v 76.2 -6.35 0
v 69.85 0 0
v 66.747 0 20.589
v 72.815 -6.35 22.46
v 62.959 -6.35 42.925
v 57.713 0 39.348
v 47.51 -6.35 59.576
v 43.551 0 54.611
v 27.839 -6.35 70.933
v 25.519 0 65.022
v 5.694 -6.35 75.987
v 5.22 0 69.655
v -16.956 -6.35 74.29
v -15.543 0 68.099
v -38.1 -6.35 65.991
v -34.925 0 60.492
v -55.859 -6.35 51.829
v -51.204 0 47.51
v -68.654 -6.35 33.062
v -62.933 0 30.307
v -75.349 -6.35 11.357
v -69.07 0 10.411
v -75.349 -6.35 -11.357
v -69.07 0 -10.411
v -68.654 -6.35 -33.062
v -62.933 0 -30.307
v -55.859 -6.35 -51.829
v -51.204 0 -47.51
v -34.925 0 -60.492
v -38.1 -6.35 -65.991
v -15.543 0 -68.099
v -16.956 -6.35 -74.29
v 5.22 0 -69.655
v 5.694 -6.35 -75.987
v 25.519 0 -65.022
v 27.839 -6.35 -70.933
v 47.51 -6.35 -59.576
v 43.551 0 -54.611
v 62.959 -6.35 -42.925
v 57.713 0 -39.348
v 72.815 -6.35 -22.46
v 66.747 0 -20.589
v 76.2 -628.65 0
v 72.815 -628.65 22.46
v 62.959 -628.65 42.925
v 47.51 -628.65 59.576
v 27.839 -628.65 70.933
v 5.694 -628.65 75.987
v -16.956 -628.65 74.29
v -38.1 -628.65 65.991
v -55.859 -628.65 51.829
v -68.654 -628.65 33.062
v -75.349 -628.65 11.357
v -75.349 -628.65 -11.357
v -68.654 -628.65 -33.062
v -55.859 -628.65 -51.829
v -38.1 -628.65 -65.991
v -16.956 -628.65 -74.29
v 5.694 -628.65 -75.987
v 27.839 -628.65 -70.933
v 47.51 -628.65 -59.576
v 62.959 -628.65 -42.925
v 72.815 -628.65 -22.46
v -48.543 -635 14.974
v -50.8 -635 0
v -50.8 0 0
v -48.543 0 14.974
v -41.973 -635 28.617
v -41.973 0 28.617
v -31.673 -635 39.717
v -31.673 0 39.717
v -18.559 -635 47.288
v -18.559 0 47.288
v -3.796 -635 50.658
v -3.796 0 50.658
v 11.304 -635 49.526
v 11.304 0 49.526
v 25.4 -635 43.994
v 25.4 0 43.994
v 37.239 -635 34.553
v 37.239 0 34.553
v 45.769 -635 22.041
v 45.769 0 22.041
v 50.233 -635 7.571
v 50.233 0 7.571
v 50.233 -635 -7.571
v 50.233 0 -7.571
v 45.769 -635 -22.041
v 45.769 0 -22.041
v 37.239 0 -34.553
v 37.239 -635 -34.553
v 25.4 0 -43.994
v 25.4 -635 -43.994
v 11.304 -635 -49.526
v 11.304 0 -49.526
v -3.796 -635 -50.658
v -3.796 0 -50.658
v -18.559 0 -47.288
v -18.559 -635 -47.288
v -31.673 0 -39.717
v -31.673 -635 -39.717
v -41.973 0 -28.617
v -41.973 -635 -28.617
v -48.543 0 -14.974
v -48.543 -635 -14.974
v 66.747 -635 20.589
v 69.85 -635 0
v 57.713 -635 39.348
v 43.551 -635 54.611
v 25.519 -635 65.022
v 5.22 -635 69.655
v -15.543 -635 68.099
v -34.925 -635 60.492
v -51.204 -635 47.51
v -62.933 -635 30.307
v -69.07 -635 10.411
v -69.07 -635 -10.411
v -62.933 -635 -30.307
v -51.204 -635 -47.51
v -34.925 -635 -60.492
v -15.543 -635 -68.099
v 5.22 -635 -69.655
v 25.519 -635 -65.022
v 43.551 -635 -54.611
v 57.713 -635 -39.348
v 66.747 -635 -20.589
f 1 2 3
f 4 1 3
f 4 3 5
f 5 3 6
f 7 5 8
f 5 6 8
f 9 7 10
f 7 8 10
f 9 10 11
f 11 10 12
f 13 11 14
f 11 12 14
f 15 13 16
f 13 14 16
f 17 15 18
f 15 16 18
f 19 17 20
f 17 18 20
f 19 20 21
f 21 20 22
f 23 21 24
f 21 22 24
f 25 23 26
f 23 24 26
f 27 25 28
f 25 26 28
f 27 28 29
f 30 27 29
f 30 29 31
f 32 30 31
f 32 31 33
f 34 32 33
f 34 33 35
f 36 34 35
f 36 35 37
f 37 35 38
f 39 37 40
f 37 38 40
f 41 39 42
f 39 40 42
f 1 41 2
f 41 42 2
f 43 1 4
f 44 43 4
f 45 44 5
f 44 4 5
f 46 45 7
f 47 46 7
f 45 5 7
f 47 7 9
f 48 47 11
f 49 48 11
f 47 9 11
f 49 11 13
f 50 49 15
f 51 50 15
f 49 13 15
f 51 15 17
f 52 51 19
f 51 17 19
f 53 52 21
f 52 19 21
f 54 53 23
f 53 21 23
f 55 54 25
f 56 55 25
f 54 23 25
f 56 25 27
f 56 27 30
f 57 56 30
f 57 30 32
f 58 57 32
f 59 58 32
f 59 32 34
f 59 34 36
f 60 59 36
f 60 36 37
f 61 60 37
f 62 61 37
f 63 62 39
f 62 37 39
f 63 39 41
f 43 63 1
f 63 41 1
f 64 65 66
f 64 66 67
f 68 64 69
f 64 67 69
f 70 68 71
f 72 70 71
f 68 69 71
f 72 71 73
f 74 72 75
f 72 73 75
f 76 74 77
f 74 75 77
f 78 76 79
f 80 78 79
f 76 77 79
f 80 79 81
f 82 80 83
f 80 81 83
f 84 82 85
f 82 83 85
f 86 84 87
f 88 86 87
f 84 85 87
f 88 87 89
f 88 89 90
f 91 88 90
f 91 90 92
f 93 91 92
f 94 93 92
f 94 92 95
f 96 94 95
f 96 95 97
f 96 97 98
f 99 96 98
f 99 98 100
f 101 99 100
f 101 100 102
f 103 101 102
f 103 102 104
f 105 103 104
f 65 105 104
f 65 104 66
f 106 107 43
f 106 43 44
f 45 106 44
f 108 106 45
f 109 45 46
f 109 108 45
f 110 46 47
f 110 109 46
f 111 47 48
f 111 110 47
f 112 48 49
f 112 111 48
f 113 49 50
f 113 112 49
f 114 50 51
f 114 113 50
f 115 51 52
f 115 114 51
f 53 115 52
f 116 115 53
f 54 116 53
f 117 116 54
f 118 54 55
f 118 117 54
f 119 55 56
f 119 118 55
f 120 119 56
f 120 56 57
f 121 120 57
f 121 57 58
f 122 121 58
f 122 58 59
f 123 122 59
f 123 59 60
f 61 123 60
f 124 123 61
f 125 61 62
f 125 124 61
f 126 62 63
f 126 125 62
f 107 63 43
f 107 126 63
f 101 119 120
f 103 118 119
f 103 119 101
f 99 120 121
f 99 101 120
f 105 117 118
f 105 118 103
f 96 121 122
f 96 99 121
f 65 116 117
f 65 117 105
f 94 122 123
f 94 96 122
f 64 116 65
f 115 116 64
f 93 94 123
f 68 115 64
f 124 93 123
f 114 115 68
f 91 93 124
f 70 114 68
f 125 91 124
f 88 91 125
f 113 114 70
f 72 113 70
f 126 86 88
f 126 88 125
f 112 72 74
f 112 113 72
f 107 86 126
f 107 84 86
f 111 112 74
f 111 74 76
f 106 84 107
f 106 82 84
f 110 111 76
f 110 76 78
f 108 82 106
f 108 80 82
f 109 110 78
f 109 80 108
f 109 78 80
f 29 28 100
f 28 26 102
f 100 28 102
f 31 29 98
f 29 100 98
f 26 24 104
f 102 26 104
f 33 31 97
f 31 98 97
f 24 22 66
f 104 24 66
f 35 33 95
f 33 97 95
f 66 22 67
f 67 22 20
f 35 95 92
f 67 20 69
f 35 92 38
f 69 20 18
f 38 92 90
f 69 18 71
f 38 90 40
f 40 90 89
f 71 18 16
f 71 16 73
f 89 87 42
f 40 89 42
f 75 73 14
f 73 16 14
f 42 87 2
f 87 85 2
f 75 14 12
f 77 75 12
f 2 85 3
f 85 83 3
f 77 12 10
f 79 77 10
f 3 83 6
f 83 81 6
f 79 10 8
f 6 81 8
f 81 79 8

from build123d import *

# Parameters (mm, degrees)
F0_R     = 76.2
F1_DEPTH = 635
F3_D     = 101.6
F4_SIZE  = 6.35
F5_SIZE  = 6.35


with BuildPart() as f1:
    # F0 (on Front) → F1 (new body)
    with BuildSketch(Plane.XZ):
        Circle(F0_R)
    extrude(amount=F1_DEPTH)

    # F3 (through all)
    with Locations(Plane.XZ.offset(635)):
        with Locations((0, 0)):
            Hole(F3_D / 2)

    # F4
    f4_edges = [f1.edges().sort_by_distance(p)[0] for p in [
        (-76.2, -635, 0),
    ]]
    chamfer(f4_edges, length=F4_SIZE)

    # F5
    f5_edges = [f1.edges().sort_by_distance(p)[0] for p in [
        (-76.2, 0, 0),
    ]]
    chamfer(f5_edges, length=F5_SIZE)


solid = f1.part
